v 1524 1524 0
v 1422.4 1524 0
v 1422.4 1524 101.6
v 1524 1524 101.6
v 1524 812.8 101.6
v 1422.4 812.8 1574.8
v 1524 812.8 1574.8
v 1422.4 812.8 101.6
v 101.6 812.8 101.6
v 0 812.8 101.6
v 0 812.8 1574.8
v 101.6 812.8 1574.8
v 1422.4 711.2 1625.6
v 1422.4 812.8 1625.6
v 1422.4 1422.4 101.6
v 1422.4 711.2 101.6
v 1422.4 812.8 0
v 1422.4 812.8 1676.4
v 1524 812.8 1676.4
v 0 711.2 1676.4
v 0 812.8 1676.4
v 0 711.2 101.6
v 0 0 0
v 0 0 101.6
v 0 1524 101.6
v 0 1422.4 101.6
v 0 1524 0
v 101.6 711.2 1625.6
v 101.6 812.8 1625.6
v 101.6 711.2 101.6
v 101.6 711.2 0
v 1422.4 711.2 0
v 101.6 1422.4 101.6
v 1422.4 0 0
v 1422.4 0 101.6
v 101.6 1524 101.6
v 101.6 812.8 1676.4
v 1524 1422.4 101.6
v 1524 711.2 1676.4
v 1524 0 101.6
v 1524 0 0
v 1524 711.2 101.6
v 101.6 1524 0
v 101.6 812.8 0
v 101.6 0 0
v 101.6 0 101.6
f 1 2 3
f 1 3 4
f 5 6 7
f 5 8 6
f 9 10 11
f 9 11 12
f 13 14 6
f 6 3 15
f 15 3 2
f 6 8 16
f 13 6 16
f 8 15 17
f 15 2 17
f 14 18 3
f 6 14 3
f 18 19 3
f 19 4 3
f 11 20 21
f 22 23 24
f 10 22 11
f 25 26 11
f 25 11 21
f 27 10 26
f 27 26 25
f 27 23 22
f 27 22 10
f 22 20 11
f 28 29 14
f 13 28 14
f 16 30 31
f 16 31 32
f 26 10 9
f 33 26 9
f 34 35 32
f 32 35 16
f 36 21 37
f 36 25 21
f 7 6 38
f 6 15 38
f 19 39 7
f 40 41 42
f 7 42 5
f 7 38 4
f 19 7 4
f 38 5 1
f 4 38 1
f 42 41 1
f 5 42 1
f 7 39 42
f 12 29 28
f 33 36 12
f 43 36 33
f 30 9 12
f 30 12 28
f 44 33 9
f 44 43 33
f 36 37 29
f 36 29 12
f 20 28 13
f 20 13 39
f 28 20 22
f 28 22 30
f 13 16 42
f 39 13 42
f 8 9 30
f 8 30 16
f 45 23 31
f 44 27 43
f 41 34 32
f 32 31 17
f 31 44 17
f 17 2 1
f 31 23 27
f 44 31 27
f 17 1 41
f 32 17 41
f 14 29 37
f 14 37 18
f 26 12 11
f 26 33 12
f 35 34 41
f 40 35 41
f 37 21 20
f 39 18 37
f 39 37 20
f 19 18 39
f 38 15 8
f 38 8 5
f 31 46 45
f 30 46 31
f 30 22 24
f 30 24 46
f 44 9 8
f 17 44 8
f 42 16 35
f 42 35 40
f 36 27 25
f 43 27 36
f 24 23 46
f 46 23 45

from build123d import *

# Parameters (mm, degrees)
SKETCH1_W           = 1524
SKETCH1_H           = 1524
BOSS_EXTRUDE1_DEPTH = 101.6
SKETCH2_W           = 1320.8
SKETCH2_H           = 711.2
CUT_EXTRUDE1_DEPTH  = 2158.65487509
SKETCH3_W           = 101.6
SKETCH3_H           = 101.6
BOSS_EXTRUDE2_DEPTH = 1524
SKETCH4_W           = 1524
SKETCH4_H           = 101.6
BOSS_EXTRUDE3_DEPTH = 50.8


with BuildPart() as part:
    # Sketch1 → Boss-Extrude1 (new body)
    with BuildSketch(Plane.XY):
        with Locations((762, 762)):
            Rectangle(SKETCH1_W, SKETCH1_H)
    extrude(amount=BOSS_EXTRUDE1_DEPTH)

    # Sketch2 → Cut-Extrude1 (cut, through all)
    with BuildSketch(Plane.XY.offset(101.6)):
        with Locations((762, 1168.4)):
            Rectangle(SKETCH2_W, SKETCH2_H)
        with Locations((762, 355.6)):
            Rectangle(SKETCH2_W, SKETCH2_H)
    extrude(amount=-CUT_EXTRUDE1_DEPTH, mode=Mode.SUBTRACT)

    # Sketch3 → Boss-Extrude2 (add)
    with BuildSketch(Plane.XY.offset(101.6)):
        with Locations((50.8, 762)):
            Rectangle(SKETCH3_W, SKETCH3_H)
        with Locations((1473.2, 762)):
            Rectangle(SKETCH3_W, SKETCH3_H)
    extrude(amount=BOSS_EXTRUDE2_DEPTH)

    # Sketch4 → Boss-Extrude3 (add)
    with BuildSketch(Plane.XY.offset(1625.6)):
        with Locations((762, 762)):
            Rectangle(SKETCH4_W, SKETCH4_H)
    extrude(amount=BOSS_EXTRUDE3_DEPTH)

    # Sketch6 → Loft1 section 0
    with BuildSketch(Plane(origin=(0, 812.8, 0), x_dir=(1, 0, 0), z_dir=(0, 1, 0))):
        with BuildLine():
            Line((1524, -1676.4), (1422.4, -1676.4))
            Line((1422.4, -1676.4), (1422.4, -1574.8))
            Line((1422.4, -1574.8), (1524, -1574.8))
            Line((1524, -1574.8), (1524, -1676.4))
        make_face()
    # Sketch5 → Loft1 section 1
    with BuildSketch(Plane.XY.offset(101.6)):
        with BuildLine():
            Line((1422.4, 1524), (1524, 1524))
            Line((1524, 1524), (1524, 1422.4))
            Line((1524, 1422.4), (1422.4, 1422.4))
            Line((1422.4, 1422.4), (1422.4, 1524))
        make_face()
    loft()

    # Sketch14 → Loft2 section 0
    with BuildSketch(Plane(origin=(0, 812.8, 0), x_dir=(1, 0, 0), z_dir=(0, 1, 0))):
        with BuildLine():
            Line((0, -1676.4), (101.6, -1676.4))
            Line((101.6, -1676.4), (101.6, -1574.8))
            Line((101.6, -1574.8), (0, -1574.8))
            Line((0, -1574.8), (0, -1676.4))
        make_face()
    # Sketch13 → Loft2 section 1
    with BuildSketch(Plane.XY.offset(101.6)):
        with BuildLine():
            Line((0, 1524), (101.6, 1524))
            Line((101.6, 1524), (101.6, 1422.4))
            Line((101.6, 1422.4), (0, 1422.4))
            Line((0, 1422.4), (0, 1524))
        make_face()
    loft()


solid = part.part
